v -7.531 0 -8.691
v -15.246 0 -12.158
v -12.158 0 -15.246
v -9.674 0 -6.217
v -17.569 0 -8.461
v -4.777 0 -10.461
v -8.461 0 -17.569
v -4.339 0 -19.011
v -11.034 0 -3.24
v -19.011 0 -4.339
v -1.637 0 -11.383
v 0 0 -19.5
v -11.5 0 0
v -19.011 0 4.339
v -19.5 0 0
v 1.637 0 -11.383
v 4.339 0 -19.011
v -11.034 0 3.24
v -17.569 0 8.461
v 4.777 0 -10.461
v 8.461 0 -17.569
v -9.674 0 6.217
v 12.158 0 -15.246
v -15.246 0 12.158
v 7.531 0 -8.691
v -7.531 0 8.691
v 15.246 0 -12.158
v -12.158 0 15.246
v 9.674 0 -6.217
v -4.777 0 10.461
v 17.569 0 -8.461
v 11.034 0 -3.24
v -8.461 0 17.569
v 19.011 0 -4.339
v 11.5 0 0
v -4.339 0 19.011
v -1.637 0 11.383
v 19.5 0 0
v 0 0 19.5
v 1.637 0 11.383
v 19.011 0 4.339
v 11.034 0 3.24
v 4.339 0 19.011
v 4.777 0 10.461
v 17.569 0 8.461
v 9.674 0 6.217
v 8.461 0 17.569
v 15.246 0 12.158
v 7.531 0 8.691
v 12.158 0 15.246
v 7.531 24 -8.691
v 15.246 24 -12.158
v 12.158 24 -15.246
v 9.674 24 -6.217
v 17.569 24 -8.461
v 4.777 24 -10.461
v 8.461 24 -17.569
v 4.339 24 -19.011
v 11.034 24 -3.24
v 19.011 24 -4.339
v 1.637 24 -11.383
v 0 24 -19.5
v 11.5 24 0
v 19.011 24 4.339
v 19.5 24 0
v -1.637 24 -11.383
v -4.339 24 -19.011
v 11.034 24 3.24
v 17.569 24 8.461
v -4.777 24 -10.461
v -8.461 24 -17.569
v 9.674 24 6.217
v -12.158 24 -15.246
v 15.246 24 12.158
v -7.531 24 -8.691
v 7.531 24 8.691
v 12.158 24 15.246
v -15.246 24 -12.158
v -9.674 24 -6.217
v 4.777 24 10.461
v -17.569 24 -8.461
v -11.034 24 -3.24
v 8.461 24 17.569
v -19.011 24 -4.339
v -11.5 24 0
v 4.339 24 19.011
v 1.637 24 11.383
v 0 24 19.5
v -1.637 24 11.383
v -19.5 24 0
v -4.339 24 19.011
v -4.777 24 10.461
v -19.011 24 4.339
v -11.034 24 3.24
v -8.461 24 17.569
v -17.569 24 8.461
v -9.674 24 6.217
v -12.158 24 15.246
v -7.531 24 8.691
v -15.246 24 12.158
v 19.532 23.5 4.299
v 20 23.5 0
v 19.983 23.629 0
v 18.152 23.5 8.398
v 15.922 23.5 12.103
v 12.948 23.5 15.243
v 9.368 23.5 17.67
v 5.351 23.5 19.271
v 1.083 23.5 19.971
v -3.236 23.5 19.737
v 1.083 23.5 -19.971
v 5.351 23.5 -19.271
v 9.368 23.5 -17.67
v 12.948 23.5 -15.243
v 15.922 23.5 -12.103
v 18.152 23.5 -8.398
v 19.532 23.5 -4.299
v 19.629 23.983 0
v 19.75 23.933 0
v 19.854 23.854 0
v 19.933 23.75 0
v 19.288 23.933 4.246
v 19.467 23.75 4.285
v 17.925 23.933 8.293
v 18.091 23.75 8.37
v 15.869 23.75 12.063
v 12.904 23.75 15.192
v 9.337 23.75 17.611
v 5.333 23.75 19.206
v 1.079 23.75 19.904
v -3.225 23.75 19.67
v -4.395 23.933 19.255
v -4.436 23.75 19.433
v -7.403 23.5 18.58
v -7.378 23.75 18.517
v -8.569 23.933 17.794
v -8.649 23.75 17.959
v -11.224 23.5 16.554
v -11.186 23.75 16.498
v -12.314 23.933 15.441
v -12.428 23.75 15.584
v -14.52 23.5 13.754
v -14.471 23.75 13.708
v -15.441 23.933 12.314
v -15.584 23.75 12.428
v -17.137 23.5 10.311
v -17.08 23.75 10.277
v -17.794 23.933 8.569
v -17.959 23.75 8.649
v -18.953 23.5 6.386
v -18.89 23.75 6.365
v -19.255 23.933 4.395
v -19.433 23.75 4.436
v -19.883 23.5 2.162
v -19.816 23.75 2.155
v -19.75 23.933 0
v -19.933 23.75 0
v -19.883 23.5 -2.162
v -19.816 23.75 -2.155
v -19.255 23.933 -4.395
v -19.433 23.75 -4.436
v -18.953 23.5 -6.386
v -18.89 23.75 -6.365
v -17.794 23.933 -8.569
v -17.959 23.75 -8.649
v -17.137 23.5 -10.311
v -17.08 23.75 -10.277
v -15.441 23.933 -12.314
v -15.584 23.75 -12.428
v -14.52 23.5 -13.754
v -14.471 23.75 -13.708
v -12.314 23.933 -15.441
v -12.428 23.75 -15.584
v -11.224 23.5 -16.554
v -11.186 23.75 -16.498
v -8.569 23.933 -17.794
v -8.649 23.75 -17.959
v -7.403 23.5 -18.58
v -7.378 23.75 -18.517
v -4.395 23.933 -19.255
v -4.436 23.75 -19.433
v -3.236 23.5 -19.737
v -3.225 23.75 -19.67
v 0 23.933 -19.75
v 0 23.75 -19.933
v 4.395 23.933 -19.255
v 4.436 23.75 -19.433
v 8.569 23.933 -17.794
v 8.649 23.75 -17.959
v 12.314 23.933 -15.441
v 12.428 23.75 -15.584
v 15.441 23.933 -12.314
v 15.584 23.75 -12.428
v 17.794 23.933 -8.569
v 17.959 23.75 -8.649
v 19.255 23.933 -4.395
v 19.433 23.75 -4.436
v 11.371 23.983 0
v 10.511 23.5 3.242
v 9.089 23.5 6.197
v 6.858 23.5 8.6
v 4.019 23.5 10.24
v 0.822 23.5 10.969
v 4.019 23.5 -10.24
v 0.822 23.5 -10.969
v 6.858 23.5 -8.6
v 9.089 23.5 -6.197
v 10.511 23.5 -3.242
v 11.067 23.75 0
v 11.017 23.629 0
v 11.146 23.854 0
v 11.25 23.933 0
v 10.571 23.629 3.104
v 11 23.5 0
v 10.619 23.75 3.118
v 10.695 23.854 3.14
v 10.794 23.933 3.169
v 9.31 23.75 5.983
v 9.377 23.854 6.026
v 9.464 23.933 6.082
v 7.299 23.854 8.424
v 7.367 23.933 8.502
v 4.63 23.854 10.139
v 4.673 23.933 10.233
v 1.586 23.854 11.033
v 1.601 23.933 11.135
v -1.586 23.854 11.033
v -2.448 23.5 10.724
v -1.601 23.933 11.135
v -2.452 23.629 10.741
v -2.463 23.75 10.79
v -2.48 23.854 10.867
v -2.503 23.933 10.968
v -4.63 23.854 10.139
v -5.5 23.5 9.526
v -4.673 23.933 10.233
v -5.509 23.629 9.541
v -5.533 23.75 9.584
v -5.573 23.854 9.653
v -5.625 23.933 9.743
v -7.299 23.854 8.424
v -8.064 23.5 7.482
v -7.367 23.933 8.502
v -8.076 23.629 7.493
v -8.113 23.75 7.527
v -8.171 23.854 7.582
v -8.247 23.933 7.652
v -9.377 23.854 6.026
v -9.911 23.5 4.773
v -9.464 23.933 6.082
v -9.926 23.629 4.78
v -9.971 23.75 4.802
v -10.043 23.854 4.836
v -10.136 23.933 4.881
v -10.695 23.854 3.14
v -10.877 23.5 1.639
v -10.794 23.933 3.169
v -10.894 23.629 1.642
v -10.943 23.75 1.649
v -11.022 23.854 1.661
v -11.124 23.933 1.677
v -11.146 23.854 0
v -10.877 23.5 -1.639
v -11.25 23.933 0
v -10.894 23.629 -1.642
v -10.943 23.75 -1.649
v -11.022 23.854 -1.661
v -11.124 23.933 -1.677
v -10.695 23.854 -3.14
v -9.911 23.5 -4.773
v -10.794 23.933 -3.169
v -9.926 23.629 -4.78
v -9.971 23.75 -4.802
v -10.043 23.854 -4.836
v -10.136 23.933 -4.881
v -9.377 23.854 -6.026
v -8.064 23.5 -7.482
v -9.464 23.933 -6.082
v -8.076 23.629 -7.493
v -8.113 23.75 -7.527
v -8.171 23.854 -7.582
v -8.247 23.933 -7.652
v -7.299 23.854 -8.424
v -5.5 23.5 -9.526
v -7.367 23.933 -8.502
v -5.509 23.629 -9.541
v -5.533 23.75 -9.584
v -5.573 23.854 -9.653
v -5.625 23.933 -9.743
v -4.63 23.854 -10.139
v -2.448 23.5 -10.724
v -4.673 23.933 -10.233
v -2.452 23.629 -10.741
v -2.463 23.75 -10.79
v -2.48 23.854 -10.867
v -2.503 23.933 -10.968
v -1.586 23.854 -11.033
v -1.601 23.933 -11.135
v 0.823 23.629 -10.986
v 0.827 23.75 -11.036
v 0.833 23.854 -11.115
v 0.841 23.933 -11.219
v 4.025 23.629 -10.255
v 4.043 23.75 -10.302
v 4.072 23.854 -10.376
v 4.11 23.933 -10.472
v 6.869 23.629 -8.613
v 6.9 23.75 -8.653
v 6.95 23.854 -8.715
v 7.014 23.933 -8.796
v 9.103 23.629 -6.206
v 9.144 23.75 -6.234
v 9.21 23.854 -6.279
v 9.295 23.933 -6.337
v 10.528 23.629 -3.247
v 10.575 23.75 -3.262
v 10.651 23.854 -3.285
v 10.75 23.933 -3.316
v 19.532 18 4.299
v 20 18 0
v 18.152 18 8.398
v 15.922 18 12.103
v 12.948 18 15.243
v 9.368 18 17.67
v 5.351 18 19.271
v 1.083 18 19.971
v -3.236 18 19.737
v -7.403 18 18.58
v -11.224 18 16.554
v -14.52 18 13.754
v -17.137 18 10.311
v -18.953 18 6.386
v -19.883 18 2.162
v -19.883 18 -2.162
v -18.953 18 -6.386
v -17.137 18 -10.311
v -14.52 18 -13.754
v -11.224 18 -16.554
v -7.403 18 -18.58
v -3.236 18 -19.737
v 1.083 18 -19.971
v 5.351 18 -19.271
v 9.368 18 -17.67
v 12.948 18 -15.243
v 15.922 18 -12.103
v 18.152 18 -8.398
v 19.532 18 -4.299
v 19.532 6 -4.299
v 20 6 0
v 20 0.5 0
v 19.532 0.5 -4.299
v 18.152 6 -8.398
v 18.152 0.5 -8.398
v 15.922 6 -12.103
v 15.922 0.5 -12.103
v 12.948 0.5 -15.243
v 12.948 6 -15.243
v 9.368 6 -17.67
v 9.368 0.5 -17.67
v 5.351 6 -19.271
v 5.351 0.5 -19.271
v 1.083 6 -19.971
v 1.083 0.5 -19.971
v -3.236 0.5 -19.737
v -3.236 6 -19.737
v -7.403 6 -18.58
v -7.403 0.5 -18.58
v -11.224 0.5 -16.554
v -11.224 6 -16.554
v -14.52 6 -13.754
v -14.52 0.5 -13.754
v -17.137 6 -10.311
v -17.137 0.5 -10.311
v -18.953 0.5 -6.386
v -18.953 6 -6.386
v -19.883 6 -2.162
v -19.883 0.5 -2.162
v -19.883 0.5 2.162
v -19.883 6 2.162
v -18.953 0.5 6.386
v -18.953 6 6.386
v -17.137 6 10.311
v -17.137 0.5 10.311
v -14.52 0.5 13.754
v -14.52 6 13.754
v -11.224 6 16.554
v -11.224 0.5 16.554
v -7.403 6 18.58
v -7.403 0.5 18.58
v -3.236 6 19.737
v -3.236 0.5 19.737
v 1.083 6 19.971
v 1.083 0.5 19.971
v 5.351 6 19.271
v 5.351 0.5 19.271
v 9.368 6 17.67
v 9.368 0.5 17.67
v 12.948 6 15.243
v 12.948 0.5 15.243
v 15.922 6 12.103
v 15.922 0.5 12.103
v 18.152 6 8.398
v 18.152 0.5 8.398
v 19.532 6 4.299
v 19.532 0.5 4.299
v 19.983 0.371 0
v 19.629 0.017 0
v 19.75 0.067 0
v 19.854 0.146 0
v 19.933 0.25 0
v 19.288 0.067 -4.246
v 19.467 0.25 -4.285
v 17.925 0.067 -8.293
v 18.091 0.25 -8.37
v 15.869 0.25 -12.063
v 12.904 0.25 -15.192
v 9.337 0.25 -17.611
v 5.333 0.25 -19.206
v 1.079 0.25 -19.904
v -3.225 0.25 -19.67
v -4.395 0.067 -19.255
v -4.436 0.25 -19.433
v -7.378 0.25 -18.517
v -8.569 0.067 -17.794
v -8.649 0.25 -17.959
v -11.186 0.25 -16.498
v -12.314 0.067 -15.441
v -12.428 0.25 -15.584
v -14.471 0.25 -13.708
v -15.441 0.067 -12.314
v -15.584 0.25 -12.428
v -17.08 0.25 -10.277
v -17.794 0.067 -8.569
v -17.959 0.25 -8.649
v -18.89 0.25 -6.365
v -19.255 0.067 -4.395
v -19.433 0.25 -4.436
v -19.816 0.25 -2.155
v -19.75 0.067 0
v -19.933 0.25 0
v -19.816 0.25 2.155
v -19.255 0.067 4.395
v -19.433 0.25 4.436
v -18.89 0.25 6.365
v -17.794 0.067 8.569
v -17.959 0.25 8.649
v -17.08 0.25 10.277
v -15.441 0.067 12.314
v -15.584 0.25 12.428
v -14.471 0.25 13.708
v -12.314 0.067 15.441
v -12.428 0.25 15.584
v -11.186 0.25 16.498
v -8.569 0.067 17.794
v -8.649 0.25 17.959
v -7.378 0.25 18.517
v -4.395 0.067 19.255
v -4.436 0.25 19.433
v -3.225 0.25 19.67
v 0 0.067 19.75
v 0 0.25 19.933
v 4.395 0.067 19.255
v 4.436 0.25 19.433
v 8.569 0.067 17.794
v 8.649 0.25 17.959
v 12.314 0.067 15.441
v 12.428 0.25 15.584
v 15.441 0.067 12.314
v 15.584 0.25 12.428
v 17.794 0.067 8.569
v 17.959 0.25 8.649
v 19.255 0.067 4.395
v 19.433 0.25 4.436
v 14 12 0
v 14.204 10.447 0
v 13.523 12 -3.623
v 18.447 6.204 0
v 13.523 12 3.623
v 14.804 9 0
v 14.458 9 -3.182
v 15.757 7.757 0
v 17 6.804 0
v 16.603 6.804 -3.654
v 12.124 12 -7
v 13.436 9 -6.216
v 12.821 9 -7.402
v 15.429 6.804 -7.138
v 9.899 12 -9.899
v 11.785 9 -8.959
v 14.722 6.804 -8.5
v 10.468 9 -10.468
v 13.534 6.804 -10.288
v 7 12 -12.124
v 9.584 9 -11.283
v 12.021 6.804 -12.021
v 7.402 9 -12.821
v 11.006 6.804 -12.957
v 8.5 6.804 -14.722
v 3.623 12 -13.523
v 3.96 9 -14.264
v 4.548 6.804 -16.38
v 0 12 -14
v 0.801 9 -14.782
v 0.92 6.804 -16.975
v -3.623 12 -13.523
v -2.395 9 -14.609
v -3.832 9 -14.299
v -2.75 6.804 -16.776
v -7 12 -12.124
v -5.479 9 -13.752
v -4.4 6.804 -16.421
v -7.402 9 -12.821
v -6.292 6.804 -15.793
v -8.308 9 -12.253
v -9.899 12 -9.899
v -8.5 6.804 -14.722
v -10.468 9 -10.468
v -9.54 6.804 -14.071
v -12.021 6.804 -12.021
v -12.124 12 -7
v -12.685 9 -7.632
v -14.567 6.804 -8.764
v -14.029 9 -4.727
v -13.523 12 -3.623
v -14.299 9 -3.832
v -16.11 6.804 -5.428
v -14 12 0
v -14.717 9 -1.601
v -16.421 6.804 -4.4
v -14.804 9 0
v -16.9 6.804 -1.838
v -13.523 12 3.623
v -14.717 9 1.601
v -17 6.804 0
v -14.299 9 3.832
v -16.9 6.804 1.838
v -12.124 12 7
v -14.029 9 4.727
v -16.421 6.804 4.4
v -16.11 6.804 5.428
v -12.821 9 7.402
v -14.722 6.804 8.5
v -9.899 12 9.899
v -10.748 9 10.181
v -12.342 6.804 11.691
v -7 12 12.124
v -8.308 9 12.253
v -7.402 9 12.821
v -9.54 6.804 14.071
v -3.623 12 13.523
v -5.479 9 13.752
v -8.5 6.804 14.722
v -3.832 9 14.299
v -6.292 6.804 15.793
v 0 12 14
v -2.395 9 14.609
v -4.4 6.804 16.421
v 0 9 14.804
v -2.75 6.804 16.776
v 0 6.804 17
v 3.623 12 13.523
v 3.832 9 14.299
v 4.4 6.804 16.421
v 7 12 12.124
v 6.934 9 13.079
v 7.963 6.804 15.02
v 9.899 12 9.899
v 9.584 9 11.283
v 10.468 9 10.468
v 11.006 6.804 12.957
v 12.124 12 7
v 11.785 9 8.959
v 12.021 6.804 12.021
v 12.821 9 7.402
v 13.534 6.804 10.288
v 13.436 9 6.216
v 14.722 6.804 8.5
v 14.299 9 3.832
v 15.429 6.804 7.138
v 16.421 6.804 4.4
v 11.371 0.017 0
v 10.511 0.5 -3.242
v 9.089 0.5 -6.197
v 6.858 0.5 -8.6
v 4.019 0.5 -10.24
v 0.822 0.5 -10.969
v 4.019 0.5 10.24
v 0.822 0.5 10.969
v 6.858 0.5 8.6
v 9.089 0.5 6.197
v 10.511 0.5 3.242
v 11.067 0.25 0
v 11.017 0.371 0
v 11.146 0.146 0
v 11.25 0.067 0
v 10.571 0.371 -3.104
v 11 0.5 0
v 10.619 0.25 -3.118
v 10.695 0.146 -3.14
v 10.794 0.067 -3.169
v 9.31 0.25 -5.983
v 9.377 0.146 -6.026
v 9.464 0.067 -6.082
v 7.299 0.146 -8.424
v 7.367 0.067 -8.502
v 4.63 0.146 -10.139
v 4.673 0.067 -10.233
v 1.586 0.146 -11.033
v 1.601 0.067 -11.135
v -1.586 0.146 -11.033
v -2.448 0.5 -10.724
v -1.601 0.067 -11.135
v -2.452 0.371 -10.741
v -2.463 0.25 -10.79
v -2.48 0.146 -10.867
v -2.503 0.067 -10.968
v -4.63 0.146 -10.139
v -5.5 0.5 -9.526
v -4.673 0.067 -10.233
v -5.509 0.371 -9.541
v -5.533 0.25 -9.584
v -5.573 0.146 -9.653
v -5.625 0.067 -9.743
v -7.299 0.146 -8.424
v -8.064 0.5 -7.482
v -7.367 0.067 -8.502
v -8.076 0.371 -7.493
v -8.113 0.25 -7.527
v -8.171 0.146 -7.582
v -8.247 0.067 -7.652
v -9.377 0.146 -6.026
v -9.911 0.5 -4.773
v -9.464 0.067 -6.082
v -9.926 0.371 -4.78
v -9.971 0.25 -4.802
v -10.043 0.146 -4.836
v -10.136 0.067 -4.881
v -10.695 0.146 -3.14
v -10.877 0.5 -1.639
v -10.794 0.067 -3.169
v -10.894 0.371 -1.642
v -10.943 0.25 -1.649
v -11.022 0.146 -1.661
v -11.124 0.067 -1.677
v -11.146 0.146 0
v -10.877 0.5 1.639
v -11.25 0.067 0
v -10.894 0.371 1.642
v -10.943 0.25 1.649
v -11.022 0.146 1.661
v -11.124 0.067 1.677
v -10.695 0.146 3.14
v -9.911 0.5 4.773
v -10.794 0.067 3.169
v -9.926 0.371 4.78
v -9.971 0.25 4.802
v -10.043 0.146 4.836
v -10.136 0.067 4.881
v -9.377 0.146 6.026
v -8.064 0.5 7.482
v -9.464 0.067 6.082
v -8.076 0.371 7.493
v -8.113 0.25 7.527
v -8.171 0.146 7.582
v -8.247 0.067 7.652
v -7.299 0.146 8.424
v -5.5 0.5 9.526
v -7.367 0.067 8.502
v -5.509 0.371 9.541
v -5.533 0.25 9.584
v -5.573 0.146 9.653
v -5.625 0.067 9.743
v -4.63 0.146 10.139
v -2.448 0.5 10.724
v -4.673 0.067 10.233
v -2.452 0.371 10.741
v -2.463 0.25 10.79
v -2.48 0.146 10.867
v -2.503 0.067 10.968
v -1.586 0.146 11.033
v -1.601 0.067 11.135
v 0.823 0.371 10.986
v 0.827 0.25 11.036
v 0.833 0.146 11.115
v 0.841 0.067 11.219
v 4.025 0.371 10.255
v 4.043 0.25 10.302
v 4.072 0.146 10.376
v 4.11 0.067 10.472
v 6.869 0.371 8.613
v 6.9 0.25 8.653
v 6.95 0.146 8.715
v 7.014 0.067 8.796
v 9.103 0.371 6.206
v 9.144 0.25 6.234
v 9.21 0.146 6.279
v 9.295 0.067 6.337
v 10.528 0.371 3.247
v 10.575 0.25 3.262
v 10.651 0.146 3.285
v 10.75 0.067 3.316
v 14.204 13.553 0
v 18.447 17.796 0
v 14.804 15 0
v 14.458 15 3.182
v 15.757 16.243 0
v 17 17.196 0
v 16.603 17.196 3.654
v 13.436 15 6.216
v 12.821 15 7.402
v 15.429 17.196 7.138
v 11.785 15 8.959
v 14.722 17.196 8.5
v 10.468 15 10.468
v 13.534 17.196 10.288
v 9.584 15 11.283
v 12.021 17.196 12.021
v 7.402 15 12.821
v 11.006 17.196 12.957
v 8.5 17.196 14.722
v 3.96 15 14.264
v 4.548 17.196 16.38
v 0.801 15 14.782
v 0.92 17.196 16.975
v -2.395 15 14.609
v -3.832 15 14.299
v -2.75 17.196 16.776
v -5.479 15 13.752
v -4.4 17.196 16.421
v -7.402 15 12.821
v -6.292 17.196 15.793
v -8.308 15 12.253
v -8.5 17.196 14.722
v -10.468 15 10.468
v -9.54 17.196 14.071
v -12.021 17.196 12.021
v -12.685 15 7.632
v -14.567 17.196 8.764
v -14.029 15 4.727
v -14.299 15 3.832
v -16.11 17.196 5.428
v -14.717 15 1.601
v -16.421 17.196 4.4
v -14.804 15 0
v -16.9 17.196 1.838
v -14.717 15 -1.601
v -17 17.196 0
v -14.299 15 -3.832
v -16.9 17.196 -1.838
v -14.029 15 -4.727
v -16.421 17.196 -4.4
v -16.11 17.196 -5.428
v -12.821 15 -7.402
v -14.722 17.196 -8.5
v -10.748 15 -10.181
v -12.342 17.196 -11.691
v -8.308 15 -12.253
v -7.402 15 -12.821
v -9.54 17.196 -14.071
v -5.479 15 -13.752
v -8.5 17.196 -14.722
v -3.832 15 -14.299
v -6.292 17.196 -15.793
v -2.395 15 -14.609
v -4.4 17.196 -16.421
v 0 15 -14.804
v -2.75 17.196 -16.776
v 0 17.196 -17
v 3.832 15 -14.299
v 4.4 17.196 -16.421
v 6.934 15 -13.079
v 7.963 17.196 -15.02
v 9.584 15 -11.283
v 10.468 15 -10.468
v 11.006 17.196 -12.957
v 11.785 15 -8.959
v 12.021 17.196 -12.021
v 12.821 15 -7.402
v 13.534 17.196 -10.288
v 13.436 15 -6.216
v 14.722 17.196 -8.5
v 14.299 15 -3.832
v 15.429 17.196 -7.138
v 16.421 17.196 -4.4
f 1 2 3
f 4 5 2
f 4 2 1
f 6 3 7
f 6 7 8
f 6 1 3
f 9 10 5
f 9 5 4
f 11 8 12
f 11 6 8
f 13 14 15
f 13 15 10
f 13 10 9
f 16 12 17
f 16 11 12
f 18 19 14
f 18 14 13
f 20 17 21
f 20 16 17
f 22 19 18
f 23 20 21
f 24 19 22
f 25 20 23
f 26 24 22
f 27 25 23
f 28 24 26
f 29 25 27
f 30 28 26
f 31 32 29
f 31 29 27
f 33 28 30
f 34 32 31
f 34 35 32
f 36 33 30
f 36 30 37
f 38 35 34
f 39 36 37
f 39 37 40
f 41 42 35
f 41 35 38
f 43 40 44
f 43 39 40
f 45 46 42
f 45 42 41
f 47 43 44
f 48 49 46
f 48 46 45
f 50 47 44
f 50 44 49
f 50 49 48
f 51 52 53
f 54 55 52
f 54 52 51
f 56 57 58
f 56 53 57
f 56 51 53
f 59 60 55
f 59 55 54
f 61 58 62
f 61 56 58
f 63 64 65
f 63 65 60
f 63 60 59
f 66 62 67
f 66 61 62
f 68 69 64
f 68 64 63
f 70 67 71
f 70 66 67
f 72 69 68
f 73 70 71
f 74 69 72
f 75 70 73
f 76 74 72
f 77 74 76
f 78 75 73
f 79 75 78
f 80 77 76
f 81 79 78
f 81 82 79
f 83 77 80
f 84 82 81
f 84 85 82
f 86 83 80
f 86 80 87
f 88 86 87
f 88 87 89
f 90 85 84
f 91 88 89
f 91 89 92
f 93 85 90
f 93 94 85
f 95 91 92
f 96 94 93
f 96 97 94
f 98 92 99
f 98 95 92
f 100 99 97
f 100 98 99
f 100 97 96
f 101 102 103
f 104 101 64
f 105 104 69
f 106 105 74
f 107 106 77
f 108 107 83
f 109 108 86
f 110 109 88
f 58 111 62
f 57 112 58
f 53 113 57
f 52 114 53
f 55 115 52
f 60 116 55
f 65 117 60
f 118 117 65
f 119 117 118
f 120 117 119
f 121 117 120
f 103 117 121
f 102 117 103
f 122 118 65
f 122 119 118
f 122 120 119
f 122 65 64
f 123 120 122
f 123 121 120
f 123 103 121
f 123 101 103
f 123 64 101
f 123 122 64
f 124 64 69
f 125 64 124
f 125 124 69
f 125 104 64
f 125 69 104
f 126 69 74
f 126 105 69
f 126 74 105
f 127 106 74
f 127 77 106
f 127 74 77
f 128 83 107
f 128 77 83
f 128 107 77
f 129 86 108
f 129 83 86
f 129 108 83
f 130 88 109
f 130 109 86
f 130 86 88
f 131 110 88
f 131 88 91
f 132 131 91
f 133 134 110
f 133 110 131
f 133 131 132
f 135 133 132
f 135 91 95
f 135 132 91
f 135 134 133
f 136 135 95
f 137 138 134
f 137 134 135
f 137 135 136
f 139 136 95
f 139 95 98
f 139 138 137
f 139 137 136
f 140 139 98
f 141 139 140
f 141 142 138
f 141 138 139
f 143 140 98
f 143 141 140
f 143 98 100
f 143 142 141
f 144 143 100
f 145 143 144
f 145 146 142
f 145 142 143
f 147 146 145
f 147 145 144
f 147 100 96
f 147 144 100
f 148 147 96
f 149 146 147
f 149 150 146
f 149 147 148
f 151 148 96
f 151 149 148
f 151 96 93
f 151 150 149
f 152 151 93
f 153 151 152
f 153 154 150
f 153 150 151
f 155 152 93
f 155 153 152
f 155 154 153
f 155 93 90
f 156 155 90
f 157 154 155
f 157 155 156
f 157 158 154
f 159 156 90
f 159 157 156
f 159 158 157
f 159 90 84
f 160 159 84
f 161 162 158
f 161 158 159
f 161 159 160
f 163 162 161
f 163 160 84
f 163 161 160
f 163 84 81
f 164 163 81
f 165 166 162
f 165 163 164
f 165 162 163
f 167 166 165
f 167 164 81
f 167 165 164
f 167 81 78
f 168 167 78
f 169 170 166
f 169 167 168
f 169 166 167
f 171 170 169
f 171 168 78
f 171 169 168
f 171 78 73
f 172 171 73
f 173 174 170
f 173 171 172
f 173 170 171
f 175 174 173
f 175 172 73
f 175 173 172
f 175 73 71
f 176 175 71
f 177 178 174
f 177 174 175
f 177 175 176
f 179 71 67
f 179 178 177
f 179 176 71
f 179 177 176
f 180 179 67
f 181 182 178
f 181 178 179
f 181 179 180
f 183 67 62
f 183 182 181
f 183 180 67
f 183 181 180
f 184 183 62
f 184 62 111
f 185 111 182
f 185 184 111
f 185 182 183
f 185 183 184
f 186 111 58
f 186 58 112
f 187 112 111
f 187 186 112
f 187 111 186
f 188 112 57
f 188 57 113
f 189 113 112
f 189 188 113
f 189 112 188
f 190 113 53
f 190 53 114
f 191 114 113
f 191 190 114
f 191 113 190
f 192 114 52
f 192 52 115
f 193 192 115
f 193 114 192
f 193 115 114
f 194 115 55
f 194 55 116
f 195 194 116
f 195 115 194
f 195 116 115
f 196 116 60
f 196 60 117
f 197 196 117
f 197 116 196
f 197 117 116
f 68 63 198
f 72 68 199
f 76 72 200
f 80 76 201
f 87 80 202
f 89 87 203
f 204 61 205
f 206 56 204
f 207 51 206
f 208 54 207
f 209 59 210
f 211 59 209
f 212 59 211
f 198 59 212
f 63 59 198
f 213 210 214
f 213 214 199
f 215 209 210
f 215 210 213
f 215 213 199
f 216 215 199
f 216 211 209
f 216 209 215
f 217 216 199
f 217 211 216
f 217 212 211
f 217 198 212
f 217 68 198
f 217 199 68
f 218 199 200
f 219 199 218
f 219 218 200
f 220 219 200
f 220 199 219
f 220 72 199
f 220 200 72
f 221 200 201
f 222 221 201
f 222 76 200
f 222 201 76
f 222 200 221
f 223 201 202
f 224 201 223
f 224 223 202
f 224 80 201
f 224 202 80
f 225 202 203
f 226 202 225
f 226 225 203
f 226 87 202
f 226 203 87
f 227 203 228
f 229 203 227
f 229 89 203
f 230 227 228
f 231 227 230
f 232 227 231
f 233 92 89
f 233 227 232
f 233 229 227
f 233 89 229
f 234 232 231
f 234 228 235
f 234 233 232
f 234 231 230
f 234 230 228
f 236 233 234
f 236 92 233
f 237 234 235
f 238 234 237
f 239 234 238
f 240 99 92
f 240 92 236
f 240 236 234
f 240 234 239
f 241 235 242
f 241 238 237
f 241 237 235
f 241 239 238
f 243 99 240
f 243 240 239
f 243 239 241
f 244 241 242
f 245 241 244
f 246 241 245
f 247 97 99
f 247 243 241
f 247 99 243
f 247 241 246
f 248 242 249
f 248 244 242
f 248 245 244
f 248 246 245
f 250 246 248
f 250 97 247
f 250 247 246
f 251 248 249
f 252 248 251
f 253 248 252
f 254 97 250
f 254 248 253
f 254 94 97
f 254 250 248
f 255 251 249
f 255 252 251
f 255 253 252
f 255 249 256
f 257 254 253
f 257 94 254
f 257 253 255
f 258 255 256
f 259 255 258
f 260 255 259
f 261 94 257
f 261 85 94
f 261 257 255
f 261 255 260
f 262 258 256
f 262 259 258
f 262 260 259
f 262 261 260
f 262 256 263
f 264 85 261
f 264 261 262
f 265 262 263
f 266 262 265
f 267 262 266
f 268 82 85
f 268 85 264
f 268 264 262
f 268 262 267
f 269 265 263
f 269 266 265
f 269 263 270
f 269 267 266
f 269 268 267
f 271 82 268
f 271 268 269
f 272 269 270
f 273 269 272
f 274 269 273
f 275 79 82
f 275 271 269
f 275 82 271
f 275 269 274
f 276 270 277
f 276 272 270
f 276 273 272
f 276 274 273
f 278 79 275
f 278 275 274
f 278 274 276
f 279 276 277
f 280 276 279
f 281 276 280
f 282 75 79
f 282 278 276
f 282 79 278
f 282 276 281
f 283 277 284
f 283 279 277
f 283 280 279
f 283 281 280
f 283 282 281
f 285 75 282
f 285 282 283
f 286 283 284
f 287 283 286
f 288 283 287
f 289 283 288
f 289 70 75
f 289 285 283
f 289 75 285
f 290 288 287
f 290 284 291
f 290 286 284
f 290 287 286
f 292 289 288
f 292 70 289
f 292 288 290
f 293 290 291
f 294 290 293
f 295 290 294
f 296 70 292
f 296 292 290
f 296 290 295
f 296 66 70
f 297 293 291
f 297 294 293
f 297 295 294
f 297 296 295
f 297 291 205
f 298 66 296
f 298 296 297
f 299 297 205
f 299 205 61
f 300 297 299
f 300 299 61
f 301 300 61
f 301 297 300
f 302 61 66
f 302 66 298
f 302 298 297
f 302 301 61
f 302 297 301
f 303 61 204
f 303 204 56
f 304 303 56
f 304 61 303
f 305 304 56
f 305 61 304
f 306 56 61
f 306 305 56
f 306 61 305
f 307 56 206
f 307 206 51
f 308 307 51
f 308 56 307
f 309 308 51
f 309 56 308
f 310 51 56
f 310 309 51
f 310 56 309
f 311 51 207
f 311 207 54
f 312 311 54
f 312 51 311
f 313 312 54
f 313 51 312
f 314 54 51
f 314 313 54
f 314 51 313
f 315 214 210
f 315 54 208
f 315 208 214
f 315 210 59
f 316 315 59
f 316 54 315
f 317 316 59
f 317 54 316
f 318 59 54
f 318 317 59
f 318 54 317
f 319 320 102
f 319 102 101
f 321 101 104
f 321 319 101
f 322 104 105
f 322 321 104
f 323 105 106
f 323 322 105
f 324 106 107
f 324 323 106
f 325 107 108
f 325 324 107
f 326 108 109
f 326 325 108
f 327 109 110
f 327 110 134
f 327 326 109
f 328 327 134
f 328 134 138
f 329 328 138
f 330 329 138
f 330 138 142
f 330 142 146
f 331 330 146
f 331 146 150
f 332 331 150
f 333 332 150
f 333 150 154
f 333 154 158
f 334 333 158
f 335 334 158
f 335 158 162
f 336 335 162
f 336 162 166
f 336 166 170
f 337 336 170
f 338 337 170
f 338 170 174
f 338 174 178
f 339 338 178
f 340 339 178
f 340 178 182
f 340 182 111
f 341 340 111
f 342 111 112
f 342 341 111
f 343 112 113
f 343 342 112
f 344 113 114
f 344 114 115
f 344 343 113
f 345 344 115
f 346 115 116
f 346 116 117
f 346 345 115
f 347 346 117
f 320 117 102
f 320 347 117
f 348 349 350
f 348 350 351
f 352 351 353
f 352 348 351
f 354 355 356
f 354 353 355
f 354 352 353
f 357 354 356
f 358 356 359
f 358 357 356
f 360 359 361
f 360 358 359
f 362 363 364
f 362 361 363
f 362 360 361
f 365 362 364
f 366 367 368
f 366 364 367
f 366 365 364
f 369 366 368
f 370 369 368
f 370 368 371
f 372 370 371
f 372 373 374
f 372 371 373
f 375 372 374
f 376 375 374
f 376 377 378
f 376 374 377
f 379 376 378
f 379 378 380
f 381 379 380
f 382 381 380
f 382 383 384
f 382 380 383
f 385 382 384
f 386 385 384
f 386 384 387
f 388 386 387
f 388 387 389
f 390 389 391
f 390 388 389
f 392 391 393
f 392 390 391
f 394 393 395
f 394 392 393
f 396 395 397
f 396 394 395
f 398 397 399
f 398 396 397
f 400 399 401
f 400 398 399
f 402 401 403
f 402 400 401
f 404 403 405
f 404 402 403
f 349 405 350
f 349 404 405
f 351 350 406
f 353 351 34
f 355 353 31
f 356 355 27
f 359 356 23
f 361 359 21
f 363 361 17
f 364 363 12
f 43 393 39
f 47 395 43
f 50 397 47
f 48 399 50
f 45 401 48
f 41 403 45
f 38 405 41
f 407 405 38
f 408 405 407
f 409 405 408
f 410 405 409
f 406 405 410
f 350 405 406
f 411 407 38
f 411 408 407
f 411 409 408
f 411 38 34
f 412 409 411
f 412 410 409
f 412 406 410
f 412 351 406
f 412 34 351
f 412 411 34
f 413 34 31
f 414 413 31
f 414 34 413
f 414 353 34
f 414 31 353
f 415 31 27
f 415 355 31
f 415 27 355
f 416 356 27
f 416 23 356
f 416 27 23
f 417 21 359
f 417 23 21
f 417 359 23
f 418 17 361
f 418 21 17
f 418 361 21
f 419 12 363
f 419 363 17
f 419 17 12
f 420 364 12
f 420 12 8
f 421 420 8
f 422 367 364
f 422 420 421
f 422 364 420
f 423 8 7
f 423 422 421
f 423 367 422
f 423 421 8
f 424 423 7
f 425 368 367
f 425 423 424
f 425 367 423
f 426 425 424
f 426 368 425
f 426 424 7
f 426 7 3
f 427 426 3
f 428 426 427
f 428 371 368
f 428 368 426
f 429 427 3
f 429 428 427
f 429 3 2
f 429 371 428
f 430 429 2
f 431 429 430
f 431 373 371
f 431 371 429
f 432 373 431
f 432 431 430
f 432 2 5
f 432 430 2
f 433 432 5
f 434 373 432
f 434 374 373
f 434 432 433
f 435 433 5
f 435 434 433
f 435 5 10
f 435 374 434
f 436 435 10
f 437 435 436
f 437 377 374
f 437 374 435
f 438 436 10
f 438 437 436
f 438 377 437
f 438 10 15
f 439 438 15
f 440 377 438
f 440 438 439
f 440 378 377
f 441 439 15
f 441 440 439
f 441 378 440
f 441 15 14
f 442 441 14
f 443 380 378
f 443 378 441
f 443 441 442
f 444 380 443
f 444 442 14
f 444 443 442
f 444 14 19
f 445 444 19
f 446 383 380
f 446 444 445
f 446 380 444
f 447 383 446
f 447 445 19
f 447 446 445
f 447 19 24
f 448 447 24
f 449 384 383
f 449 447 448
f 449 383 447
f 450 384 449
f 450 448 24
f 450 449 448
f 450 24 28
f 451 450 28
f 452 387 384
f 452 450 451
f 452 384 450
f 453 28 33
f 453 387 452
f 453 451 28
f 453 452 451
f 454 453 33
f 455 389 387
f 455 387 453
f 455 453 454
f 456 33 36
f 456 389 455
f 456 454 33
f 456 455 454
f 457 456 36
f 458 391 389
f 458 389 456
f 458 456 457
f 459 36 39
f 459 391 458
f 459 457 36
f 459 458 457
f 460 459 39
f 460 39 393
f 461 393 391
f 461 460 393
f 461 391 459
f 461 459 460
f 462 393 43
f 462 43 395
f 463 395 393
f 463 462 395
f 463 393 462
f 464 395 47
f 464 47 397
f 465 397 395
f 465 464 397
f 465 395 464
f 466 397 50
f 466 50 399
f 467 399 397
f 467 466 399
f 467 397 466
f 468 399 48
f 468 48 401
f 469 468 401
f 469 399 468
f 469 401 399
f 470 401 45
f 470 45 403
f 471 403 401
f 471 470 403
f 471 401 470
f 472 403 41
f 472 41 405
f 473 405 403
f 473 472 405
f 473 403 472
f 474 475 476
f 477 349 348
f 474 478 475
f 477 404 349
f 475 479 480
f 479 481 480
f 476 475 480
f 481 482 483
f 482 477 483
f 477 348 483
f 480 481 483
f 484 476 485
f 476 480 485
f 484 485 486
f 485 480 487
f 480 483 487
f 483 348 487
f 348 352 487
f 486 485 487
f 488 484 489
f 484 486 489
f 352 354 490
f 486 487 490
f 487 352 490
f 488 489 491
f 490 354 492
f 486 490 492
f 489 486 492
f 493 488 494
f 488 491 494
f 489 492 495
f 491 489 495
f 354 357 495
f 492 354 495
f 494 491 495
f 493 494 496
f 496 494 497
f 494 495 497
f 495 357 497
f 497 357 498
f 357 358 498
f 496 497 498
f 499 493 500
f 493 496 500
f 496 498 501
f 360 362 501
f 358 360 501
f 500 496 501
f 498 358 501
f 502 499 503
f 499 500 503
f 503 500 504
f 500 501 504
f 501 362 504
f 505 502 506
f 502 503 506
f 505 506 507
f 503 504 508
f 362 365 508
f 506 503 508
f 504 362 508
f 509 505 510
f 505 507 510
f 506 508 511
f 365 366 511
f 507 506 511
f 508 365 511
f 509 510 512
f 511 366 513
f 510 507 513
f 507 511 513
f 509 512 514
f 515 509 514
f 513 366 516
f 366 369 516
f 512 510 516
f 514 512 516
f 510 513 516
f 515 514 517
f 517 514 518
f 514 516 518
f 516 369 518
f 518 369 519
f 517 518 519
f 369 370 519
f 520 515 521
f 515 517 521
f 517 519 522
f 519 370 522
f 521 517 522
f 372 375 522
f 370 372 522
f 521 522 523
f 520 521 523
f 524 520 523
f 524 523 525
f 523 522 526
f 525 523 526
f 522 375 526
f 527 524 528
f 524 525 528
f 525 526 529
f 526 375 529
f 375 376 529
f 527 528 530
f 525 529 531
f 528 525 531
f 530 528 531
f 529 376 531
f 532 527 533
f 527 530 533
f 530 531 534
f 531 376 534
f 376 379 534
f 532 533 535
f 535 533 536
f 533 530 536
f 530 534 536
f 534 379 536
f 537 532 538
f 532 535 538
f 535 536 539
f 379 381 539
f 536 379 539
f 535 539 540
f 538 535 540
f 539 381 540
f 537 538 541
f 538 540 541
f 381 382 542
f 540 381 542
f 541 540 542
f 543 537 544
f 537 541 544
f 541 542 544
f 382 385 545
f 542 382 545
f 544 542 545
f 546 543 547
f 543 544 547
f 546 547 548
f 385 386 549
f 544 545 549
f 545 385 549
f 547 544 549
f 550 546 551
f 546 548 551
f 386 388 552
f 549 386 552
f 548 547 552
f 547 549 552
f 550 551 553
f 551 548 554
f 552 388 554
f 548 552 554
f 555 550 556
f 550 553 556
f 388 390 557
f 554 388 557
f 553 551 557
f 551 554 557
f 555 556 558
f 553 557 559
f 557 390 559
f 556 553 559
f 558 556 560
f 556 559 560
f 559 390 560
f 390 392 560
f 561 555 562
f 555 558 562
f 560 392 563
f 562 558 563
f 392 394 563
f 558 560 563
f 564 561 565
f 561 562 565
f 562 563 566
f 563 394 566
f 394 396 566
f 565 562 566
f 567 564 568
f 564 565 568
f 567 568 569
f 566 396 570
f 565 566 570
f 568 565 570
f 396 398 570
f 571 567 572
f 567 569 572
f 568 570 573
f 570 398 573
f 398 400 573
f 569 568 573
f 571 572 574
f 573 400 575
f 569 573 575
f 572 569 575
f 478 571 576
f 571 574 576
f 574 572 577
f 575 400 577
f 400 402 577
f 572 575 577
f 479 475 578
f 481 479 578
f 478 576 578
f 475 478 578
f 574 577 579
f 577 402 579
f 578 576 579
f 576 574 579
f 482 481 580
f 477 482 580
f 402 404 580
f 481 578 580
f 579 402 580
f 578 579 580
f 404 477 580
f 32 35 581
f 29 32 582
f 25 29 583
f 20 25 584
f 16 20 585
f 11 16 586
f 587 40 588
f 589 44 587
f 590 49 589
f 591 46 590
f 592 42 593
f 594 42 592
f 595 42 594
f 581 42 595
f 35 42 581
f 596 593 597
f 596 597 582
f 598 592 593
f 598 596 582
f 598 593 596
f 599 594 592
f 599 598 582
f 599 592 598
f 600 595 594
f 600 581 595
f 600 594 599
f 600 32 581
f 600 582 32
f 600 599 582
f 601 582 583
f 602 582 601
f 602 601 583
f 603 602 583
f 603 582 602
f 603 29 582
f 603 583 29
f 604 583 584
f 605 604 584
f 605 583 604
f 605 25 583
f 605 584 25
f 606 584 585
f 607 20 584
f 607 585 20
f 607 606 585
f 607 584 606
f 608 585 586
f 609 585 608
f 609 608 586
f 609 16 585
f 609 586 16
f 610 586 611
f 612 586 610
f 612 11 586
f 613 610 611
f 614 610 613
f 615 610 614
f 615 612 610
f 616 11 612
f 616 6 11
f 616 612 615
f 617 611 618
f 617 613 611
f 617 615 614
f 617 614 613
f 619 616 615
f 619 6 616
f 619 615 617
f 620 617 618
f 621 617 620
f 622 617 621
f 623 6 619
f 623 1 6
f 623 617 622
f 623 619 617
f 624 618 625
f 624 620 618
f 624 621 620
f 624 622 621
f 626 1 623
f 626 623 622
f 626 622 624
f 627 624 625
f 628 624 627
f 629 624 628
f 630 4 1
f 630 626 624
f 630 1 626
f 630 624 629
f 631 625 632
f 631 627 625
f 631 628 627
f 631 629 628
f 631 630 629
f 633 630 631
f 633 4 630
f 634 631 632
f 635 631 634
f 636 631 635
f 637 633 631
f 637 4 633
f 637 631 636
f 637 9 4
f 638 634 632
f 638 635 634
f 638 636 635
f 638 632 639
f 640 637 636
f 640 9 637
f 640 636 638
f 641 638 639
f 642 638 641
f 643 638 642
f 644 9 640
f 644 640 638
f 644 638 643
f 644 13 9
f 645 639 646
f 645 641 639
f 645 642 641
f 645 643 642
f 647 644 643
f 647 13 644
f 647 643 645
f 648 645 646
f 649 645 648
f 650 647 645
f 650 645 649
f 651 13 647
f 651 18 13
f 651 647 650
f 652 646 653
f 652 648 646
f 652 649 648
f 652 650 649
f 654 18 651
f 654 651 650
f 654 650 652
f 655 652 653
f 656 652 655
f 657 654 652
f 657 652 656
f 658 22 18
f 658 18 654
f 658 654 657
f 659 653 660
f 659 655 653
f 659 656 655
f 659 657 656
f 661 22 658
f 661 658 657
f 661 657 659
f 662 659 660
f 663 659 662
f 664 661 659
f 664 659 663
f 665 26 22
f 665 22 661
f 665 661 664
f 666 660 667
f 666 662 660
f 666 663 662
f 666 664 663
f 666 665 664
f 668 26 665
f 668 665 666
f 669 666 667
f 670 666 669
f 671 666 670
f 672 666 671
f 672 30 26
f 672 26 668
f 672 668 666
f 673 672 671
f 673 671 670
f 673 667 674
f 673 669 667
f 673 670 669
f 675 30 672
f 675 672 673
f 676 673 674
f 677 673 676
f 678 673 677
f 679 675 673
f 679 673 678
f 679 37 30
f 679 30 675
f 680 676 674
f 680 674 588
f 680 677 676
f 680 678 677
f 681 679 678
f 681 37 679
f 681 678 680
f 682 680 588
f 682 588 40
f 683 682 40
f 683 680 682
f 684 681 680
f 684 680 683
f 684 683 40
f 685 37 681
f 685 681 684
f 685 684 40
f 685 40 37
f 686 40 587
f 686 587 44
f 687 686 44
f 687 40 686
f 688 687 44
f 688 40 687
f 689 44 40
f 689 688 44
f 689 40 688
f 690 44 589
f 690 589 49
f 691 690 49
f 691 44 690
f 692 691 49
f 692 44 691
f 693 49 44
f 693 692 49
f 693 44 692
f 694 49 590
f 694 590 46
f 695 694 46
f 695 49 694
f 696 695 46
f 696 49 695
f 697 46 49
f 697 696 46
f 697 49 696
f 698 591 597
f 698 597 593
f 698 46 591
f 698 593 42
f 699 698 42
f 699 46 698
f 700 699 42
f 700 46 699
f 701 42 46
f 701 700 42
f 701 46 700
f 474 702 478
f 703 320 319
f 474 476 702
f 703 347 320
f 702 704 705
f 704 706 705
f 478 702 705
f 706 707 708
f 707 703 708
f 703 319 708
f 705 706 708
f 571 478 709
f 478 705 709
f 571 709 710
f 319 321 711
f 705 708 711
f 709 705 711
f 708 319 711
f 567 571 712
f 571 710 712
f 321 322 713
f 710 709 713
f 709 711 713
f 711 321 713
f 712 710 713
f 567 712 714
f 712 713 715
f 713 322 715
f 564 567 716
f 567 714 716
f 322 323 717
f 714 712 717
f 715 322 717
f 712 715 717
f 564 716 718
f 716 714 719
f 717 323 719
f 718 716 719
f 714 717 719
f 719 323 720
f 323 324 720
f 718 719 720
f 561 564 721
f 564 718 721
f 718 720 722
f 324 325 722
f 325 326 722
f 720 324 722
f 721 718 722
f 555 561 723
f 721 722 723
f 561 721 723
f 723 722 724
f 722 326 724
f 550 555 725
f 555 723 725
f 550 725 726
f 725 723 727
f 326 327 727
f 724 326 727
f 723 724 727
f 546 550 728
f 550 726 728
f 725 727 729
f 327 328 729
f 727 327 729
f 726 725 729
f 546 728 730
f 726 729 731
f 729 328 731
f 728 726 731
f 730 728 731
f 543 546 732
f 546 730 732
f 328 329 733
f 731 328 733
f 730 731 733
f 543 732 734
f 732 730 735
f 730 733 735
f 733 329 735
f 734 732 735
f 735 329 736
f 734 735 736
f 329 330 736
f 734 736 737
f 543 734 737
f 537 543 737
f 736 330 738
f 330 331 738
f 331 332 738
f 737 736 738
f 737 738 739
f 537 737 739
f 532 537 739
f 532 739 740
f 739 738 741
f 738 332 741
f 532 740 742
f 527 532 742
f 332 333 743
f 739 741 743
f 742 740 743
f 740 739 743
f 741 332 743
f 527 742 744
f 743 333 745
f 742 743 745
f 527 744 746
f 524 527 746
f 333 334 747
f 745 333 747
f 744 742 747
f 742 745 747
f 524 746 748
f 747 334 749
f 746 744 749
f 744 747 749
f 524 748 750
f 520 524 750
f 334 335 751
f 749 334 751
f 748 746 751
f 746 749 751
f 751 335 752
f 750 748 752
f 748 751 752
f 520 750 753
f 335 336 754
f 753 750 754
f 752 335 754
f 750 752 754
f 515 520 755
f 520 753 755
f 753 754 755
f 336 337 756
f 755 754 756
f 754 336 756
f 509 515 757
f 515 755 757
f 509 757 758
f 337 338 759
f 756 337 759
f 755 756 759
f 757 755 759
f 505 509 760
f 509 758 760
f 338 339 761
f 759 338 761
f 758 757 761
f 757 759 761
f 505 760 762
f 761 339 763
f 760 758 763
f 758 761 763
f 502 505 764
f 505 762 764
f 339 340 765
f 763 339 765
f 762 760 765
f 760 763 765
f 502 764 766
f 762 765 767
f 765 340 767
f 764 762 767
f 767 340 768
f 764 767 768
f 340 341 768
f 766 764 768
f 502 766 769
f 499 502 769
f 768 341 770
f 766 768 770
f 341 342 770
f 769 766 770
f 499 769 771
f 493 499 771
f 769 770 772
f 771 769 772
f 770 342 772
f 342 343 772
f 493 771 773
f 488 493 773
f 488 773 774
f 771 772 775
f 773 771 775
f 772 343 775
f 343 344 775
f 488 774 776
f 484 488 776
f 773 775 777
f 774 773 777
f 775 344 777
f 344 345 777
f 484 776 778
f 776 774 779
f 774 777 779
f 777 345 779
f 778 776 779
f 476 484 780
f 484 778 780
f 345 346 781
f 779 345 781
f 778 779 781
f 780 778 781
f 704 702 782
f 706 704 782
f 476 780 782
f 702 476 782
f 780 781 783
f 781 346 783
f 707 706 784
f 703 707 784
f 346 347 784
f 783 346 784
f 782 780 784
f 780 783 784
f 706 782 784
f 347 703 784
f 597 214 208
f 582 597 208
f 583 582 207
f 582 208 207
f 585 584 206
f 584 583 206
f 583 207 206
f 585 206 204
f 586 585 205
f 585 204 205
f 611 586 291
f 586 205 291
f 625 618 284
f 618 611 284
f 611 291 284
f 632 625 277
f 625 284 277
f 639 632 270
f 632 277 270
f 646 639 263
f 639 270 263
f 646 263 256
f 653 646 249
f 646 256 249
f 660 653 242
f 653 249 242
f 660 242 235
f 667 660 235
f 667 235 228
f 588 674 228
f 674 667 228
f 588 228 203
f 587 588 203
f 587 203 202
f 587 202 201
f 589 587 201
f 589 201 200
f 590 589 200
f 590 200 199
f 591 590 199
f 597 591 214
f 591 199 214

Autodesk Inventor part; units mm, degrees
ref_plane "YZ Plane" through (0, 0, 0) normal (1, 0, 0) x (0, 1, 0)
ref_plane "XZ Plane" through (0, 0, 0) normal (0, 1, 0) x (-1, 0, 0)
ref_plane "XY Plane" through (0, 0, 0) normal (0, 0, 1) x (1, 0, 0)
sketch "Sketch1" plane through (0, 0, 0) normal (0, 0, 1) x (1, 0, 0)
  line L0 (0, 0) -> (20, 0)
  line L1 (20, 0) -> (20, 12)
  line L2 (20, 12) -> (0, 12)
  line L3 (0, 12) -> (0, 0)
  line L4 (0, 0) -> (11, 0)
  line L5 (11, 0) -> (11, 12)
  line L6 (11, 12) -> (0, 12)
  line L7 (0, 12) -> (0, 0)
  line L8 (20, 12) -> (20, 12)
  arc A0 (14, 12) -> (23.7265, 7.2975) centre (20, 12) ccw
  point P0 (20, 6)
  dimension "d0" = 20
  dimension "d1" = 12
  dimension "d2" = 11
  dimension "d3" = 0
  dimension "d4" = 6
revolve "Revolution1" add sketch "Sketch1" angle 360 about axis through (0, 12, 0) along (0, -1, 0) contours L5 L2 A0 L1 L0
mirror "Mirror1" about plane through (14, 12, 0) normal (0, 1, 0) of "Revolution1"
fillet "Fillet1" radius 0.5 4 edges at (-20, 0, 0) (-11, 0, 0) (-20, 24, 0) (-11, 24, 0)
properties part number "DriveWheelHalf"
